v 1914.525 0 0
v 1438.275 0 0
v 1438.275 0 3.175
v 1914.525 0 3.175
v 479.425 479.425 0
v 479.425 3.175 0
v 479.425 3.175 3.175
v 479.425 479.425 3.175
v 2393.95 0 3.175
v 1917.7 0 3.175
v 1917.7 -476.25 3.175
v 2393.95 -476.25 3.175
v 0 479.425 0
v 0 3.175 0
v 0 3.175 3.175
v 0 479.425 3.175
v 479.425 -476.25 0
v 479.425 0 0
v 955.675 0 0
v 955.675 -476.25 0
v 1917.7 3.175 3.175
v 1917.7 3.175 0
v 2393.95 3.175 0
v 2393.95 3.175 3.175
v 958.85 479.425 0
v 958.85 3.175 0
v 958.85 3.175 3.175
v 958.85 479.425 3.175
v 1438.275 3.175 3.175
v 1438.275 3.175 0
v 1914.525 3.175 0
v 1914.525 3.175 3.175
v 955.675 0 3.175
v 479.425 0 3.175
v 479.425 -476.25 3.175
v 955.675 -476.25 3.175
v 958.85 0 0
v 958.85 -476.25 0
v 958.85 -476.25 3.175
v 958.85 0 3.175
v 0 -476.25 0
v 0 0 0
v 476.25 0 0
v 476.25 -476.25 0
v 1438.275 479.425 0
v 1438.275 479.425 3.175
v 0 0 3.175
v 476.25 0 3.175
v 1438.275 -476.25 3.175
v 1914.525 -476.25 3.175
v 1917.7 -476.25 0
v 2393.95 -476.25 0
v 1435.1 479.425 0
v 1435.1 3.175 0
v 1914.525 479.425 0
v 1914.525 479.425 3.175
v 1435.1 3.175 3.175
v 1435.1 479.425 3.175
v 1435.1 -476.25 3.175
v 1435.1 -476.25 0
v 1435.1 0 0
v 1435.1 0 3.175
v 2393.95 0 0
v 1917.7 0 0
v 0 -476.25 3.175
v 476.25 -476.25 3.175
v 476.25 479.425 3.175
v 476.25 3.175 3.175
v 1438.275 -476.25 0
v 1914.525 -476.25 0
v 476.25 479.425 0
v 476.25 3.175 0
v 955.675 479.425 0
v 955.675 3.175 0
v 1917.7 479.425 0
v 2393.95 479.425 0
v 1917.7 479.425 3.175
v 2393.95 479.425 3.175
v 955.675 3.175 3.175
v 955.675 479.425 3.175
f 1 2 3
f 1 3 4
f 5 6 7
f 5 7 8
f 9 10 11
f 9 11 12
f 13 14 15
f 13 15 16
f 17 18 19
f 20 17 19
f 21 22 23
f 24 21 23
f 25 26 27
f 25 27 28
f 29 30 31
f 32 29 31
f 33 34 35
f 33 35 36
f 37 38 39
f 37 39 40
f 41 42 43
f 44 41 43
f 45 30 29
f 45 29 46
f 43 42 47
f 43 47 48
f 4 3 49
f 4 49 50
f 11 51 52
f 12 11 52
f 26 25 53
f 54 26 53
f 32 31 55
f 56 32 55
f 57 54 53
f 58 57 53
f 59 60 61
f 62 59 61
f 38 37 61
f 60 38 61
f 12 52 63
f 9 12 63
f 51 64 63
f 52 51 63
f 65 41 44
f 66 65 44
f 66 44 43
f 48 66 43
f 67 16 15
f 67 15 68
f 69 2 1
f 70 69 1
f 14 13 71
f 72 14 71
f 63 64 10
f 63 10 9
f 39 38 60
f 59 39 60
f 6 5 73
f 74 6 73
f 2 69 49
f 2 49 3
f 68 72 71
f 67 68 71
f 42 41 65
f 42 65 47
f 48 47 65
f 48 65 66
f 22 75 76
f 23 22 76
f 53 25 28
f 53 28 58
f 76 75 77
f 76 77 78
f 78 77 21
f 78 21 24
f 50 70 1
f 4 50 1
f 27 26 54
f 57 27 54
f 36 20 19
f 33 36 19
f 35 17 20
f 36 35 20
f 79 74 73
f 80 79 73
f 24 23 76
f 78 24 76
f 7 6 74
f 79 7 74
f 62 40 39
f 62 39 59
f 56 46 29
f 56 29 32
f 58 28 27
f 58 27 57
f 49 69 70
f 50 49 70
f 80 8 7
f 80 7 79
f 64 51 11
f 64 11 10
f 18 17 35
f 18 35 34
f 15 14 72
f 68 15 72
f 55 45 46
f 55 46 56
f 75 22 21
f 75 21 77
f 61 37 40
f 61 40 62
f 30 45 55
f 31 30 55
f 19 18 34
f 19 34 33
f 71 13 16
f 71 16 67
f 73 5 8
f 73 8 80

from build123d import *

# Parameters (mm, degrees)
F0_W     = 476.25
F0_H     = 476.25
F1_DEPTH = 3.175


with BuildPart() as f1:
    # F0 (on Top) → F1 (new body)
    with BuildSketch(Plane.XY):
        with Locations((238.125, -238.125)):
            Rectangle(F0_W, F0_H)
        with Locations((238.125, 241.3)):
            Rectangle(F0_W, F0_H)
        with Locations((717.55, -238.125)):
            Rectangle(F0_W, F0_H)
        with Locations((717.55, 241.3)):
            Rectangle(F0_W, F0_H)
        with Locations((1196.975, -238.125)):
            Rectangle(F0_W, F0_H)
        with Locations((1196.975, 241.3)):
            Rectangle(F0_W, F0_H)
        with Locations((1676.4, -238.125)):
            Rectangle(F0_W, F0_H)
        with Locations((1676.4, 241.3)):
            Rectangle(F0_W, F0_H)
        with Locations((2155.825, -238.125)):
            Rectangle(F0_W, F0_H)
        with Locations((2155.825, 241.3)):
            Rectangle(F0_W, F0_H)
    extrude(amount=F1_DEPTH)


solid = f1.part
